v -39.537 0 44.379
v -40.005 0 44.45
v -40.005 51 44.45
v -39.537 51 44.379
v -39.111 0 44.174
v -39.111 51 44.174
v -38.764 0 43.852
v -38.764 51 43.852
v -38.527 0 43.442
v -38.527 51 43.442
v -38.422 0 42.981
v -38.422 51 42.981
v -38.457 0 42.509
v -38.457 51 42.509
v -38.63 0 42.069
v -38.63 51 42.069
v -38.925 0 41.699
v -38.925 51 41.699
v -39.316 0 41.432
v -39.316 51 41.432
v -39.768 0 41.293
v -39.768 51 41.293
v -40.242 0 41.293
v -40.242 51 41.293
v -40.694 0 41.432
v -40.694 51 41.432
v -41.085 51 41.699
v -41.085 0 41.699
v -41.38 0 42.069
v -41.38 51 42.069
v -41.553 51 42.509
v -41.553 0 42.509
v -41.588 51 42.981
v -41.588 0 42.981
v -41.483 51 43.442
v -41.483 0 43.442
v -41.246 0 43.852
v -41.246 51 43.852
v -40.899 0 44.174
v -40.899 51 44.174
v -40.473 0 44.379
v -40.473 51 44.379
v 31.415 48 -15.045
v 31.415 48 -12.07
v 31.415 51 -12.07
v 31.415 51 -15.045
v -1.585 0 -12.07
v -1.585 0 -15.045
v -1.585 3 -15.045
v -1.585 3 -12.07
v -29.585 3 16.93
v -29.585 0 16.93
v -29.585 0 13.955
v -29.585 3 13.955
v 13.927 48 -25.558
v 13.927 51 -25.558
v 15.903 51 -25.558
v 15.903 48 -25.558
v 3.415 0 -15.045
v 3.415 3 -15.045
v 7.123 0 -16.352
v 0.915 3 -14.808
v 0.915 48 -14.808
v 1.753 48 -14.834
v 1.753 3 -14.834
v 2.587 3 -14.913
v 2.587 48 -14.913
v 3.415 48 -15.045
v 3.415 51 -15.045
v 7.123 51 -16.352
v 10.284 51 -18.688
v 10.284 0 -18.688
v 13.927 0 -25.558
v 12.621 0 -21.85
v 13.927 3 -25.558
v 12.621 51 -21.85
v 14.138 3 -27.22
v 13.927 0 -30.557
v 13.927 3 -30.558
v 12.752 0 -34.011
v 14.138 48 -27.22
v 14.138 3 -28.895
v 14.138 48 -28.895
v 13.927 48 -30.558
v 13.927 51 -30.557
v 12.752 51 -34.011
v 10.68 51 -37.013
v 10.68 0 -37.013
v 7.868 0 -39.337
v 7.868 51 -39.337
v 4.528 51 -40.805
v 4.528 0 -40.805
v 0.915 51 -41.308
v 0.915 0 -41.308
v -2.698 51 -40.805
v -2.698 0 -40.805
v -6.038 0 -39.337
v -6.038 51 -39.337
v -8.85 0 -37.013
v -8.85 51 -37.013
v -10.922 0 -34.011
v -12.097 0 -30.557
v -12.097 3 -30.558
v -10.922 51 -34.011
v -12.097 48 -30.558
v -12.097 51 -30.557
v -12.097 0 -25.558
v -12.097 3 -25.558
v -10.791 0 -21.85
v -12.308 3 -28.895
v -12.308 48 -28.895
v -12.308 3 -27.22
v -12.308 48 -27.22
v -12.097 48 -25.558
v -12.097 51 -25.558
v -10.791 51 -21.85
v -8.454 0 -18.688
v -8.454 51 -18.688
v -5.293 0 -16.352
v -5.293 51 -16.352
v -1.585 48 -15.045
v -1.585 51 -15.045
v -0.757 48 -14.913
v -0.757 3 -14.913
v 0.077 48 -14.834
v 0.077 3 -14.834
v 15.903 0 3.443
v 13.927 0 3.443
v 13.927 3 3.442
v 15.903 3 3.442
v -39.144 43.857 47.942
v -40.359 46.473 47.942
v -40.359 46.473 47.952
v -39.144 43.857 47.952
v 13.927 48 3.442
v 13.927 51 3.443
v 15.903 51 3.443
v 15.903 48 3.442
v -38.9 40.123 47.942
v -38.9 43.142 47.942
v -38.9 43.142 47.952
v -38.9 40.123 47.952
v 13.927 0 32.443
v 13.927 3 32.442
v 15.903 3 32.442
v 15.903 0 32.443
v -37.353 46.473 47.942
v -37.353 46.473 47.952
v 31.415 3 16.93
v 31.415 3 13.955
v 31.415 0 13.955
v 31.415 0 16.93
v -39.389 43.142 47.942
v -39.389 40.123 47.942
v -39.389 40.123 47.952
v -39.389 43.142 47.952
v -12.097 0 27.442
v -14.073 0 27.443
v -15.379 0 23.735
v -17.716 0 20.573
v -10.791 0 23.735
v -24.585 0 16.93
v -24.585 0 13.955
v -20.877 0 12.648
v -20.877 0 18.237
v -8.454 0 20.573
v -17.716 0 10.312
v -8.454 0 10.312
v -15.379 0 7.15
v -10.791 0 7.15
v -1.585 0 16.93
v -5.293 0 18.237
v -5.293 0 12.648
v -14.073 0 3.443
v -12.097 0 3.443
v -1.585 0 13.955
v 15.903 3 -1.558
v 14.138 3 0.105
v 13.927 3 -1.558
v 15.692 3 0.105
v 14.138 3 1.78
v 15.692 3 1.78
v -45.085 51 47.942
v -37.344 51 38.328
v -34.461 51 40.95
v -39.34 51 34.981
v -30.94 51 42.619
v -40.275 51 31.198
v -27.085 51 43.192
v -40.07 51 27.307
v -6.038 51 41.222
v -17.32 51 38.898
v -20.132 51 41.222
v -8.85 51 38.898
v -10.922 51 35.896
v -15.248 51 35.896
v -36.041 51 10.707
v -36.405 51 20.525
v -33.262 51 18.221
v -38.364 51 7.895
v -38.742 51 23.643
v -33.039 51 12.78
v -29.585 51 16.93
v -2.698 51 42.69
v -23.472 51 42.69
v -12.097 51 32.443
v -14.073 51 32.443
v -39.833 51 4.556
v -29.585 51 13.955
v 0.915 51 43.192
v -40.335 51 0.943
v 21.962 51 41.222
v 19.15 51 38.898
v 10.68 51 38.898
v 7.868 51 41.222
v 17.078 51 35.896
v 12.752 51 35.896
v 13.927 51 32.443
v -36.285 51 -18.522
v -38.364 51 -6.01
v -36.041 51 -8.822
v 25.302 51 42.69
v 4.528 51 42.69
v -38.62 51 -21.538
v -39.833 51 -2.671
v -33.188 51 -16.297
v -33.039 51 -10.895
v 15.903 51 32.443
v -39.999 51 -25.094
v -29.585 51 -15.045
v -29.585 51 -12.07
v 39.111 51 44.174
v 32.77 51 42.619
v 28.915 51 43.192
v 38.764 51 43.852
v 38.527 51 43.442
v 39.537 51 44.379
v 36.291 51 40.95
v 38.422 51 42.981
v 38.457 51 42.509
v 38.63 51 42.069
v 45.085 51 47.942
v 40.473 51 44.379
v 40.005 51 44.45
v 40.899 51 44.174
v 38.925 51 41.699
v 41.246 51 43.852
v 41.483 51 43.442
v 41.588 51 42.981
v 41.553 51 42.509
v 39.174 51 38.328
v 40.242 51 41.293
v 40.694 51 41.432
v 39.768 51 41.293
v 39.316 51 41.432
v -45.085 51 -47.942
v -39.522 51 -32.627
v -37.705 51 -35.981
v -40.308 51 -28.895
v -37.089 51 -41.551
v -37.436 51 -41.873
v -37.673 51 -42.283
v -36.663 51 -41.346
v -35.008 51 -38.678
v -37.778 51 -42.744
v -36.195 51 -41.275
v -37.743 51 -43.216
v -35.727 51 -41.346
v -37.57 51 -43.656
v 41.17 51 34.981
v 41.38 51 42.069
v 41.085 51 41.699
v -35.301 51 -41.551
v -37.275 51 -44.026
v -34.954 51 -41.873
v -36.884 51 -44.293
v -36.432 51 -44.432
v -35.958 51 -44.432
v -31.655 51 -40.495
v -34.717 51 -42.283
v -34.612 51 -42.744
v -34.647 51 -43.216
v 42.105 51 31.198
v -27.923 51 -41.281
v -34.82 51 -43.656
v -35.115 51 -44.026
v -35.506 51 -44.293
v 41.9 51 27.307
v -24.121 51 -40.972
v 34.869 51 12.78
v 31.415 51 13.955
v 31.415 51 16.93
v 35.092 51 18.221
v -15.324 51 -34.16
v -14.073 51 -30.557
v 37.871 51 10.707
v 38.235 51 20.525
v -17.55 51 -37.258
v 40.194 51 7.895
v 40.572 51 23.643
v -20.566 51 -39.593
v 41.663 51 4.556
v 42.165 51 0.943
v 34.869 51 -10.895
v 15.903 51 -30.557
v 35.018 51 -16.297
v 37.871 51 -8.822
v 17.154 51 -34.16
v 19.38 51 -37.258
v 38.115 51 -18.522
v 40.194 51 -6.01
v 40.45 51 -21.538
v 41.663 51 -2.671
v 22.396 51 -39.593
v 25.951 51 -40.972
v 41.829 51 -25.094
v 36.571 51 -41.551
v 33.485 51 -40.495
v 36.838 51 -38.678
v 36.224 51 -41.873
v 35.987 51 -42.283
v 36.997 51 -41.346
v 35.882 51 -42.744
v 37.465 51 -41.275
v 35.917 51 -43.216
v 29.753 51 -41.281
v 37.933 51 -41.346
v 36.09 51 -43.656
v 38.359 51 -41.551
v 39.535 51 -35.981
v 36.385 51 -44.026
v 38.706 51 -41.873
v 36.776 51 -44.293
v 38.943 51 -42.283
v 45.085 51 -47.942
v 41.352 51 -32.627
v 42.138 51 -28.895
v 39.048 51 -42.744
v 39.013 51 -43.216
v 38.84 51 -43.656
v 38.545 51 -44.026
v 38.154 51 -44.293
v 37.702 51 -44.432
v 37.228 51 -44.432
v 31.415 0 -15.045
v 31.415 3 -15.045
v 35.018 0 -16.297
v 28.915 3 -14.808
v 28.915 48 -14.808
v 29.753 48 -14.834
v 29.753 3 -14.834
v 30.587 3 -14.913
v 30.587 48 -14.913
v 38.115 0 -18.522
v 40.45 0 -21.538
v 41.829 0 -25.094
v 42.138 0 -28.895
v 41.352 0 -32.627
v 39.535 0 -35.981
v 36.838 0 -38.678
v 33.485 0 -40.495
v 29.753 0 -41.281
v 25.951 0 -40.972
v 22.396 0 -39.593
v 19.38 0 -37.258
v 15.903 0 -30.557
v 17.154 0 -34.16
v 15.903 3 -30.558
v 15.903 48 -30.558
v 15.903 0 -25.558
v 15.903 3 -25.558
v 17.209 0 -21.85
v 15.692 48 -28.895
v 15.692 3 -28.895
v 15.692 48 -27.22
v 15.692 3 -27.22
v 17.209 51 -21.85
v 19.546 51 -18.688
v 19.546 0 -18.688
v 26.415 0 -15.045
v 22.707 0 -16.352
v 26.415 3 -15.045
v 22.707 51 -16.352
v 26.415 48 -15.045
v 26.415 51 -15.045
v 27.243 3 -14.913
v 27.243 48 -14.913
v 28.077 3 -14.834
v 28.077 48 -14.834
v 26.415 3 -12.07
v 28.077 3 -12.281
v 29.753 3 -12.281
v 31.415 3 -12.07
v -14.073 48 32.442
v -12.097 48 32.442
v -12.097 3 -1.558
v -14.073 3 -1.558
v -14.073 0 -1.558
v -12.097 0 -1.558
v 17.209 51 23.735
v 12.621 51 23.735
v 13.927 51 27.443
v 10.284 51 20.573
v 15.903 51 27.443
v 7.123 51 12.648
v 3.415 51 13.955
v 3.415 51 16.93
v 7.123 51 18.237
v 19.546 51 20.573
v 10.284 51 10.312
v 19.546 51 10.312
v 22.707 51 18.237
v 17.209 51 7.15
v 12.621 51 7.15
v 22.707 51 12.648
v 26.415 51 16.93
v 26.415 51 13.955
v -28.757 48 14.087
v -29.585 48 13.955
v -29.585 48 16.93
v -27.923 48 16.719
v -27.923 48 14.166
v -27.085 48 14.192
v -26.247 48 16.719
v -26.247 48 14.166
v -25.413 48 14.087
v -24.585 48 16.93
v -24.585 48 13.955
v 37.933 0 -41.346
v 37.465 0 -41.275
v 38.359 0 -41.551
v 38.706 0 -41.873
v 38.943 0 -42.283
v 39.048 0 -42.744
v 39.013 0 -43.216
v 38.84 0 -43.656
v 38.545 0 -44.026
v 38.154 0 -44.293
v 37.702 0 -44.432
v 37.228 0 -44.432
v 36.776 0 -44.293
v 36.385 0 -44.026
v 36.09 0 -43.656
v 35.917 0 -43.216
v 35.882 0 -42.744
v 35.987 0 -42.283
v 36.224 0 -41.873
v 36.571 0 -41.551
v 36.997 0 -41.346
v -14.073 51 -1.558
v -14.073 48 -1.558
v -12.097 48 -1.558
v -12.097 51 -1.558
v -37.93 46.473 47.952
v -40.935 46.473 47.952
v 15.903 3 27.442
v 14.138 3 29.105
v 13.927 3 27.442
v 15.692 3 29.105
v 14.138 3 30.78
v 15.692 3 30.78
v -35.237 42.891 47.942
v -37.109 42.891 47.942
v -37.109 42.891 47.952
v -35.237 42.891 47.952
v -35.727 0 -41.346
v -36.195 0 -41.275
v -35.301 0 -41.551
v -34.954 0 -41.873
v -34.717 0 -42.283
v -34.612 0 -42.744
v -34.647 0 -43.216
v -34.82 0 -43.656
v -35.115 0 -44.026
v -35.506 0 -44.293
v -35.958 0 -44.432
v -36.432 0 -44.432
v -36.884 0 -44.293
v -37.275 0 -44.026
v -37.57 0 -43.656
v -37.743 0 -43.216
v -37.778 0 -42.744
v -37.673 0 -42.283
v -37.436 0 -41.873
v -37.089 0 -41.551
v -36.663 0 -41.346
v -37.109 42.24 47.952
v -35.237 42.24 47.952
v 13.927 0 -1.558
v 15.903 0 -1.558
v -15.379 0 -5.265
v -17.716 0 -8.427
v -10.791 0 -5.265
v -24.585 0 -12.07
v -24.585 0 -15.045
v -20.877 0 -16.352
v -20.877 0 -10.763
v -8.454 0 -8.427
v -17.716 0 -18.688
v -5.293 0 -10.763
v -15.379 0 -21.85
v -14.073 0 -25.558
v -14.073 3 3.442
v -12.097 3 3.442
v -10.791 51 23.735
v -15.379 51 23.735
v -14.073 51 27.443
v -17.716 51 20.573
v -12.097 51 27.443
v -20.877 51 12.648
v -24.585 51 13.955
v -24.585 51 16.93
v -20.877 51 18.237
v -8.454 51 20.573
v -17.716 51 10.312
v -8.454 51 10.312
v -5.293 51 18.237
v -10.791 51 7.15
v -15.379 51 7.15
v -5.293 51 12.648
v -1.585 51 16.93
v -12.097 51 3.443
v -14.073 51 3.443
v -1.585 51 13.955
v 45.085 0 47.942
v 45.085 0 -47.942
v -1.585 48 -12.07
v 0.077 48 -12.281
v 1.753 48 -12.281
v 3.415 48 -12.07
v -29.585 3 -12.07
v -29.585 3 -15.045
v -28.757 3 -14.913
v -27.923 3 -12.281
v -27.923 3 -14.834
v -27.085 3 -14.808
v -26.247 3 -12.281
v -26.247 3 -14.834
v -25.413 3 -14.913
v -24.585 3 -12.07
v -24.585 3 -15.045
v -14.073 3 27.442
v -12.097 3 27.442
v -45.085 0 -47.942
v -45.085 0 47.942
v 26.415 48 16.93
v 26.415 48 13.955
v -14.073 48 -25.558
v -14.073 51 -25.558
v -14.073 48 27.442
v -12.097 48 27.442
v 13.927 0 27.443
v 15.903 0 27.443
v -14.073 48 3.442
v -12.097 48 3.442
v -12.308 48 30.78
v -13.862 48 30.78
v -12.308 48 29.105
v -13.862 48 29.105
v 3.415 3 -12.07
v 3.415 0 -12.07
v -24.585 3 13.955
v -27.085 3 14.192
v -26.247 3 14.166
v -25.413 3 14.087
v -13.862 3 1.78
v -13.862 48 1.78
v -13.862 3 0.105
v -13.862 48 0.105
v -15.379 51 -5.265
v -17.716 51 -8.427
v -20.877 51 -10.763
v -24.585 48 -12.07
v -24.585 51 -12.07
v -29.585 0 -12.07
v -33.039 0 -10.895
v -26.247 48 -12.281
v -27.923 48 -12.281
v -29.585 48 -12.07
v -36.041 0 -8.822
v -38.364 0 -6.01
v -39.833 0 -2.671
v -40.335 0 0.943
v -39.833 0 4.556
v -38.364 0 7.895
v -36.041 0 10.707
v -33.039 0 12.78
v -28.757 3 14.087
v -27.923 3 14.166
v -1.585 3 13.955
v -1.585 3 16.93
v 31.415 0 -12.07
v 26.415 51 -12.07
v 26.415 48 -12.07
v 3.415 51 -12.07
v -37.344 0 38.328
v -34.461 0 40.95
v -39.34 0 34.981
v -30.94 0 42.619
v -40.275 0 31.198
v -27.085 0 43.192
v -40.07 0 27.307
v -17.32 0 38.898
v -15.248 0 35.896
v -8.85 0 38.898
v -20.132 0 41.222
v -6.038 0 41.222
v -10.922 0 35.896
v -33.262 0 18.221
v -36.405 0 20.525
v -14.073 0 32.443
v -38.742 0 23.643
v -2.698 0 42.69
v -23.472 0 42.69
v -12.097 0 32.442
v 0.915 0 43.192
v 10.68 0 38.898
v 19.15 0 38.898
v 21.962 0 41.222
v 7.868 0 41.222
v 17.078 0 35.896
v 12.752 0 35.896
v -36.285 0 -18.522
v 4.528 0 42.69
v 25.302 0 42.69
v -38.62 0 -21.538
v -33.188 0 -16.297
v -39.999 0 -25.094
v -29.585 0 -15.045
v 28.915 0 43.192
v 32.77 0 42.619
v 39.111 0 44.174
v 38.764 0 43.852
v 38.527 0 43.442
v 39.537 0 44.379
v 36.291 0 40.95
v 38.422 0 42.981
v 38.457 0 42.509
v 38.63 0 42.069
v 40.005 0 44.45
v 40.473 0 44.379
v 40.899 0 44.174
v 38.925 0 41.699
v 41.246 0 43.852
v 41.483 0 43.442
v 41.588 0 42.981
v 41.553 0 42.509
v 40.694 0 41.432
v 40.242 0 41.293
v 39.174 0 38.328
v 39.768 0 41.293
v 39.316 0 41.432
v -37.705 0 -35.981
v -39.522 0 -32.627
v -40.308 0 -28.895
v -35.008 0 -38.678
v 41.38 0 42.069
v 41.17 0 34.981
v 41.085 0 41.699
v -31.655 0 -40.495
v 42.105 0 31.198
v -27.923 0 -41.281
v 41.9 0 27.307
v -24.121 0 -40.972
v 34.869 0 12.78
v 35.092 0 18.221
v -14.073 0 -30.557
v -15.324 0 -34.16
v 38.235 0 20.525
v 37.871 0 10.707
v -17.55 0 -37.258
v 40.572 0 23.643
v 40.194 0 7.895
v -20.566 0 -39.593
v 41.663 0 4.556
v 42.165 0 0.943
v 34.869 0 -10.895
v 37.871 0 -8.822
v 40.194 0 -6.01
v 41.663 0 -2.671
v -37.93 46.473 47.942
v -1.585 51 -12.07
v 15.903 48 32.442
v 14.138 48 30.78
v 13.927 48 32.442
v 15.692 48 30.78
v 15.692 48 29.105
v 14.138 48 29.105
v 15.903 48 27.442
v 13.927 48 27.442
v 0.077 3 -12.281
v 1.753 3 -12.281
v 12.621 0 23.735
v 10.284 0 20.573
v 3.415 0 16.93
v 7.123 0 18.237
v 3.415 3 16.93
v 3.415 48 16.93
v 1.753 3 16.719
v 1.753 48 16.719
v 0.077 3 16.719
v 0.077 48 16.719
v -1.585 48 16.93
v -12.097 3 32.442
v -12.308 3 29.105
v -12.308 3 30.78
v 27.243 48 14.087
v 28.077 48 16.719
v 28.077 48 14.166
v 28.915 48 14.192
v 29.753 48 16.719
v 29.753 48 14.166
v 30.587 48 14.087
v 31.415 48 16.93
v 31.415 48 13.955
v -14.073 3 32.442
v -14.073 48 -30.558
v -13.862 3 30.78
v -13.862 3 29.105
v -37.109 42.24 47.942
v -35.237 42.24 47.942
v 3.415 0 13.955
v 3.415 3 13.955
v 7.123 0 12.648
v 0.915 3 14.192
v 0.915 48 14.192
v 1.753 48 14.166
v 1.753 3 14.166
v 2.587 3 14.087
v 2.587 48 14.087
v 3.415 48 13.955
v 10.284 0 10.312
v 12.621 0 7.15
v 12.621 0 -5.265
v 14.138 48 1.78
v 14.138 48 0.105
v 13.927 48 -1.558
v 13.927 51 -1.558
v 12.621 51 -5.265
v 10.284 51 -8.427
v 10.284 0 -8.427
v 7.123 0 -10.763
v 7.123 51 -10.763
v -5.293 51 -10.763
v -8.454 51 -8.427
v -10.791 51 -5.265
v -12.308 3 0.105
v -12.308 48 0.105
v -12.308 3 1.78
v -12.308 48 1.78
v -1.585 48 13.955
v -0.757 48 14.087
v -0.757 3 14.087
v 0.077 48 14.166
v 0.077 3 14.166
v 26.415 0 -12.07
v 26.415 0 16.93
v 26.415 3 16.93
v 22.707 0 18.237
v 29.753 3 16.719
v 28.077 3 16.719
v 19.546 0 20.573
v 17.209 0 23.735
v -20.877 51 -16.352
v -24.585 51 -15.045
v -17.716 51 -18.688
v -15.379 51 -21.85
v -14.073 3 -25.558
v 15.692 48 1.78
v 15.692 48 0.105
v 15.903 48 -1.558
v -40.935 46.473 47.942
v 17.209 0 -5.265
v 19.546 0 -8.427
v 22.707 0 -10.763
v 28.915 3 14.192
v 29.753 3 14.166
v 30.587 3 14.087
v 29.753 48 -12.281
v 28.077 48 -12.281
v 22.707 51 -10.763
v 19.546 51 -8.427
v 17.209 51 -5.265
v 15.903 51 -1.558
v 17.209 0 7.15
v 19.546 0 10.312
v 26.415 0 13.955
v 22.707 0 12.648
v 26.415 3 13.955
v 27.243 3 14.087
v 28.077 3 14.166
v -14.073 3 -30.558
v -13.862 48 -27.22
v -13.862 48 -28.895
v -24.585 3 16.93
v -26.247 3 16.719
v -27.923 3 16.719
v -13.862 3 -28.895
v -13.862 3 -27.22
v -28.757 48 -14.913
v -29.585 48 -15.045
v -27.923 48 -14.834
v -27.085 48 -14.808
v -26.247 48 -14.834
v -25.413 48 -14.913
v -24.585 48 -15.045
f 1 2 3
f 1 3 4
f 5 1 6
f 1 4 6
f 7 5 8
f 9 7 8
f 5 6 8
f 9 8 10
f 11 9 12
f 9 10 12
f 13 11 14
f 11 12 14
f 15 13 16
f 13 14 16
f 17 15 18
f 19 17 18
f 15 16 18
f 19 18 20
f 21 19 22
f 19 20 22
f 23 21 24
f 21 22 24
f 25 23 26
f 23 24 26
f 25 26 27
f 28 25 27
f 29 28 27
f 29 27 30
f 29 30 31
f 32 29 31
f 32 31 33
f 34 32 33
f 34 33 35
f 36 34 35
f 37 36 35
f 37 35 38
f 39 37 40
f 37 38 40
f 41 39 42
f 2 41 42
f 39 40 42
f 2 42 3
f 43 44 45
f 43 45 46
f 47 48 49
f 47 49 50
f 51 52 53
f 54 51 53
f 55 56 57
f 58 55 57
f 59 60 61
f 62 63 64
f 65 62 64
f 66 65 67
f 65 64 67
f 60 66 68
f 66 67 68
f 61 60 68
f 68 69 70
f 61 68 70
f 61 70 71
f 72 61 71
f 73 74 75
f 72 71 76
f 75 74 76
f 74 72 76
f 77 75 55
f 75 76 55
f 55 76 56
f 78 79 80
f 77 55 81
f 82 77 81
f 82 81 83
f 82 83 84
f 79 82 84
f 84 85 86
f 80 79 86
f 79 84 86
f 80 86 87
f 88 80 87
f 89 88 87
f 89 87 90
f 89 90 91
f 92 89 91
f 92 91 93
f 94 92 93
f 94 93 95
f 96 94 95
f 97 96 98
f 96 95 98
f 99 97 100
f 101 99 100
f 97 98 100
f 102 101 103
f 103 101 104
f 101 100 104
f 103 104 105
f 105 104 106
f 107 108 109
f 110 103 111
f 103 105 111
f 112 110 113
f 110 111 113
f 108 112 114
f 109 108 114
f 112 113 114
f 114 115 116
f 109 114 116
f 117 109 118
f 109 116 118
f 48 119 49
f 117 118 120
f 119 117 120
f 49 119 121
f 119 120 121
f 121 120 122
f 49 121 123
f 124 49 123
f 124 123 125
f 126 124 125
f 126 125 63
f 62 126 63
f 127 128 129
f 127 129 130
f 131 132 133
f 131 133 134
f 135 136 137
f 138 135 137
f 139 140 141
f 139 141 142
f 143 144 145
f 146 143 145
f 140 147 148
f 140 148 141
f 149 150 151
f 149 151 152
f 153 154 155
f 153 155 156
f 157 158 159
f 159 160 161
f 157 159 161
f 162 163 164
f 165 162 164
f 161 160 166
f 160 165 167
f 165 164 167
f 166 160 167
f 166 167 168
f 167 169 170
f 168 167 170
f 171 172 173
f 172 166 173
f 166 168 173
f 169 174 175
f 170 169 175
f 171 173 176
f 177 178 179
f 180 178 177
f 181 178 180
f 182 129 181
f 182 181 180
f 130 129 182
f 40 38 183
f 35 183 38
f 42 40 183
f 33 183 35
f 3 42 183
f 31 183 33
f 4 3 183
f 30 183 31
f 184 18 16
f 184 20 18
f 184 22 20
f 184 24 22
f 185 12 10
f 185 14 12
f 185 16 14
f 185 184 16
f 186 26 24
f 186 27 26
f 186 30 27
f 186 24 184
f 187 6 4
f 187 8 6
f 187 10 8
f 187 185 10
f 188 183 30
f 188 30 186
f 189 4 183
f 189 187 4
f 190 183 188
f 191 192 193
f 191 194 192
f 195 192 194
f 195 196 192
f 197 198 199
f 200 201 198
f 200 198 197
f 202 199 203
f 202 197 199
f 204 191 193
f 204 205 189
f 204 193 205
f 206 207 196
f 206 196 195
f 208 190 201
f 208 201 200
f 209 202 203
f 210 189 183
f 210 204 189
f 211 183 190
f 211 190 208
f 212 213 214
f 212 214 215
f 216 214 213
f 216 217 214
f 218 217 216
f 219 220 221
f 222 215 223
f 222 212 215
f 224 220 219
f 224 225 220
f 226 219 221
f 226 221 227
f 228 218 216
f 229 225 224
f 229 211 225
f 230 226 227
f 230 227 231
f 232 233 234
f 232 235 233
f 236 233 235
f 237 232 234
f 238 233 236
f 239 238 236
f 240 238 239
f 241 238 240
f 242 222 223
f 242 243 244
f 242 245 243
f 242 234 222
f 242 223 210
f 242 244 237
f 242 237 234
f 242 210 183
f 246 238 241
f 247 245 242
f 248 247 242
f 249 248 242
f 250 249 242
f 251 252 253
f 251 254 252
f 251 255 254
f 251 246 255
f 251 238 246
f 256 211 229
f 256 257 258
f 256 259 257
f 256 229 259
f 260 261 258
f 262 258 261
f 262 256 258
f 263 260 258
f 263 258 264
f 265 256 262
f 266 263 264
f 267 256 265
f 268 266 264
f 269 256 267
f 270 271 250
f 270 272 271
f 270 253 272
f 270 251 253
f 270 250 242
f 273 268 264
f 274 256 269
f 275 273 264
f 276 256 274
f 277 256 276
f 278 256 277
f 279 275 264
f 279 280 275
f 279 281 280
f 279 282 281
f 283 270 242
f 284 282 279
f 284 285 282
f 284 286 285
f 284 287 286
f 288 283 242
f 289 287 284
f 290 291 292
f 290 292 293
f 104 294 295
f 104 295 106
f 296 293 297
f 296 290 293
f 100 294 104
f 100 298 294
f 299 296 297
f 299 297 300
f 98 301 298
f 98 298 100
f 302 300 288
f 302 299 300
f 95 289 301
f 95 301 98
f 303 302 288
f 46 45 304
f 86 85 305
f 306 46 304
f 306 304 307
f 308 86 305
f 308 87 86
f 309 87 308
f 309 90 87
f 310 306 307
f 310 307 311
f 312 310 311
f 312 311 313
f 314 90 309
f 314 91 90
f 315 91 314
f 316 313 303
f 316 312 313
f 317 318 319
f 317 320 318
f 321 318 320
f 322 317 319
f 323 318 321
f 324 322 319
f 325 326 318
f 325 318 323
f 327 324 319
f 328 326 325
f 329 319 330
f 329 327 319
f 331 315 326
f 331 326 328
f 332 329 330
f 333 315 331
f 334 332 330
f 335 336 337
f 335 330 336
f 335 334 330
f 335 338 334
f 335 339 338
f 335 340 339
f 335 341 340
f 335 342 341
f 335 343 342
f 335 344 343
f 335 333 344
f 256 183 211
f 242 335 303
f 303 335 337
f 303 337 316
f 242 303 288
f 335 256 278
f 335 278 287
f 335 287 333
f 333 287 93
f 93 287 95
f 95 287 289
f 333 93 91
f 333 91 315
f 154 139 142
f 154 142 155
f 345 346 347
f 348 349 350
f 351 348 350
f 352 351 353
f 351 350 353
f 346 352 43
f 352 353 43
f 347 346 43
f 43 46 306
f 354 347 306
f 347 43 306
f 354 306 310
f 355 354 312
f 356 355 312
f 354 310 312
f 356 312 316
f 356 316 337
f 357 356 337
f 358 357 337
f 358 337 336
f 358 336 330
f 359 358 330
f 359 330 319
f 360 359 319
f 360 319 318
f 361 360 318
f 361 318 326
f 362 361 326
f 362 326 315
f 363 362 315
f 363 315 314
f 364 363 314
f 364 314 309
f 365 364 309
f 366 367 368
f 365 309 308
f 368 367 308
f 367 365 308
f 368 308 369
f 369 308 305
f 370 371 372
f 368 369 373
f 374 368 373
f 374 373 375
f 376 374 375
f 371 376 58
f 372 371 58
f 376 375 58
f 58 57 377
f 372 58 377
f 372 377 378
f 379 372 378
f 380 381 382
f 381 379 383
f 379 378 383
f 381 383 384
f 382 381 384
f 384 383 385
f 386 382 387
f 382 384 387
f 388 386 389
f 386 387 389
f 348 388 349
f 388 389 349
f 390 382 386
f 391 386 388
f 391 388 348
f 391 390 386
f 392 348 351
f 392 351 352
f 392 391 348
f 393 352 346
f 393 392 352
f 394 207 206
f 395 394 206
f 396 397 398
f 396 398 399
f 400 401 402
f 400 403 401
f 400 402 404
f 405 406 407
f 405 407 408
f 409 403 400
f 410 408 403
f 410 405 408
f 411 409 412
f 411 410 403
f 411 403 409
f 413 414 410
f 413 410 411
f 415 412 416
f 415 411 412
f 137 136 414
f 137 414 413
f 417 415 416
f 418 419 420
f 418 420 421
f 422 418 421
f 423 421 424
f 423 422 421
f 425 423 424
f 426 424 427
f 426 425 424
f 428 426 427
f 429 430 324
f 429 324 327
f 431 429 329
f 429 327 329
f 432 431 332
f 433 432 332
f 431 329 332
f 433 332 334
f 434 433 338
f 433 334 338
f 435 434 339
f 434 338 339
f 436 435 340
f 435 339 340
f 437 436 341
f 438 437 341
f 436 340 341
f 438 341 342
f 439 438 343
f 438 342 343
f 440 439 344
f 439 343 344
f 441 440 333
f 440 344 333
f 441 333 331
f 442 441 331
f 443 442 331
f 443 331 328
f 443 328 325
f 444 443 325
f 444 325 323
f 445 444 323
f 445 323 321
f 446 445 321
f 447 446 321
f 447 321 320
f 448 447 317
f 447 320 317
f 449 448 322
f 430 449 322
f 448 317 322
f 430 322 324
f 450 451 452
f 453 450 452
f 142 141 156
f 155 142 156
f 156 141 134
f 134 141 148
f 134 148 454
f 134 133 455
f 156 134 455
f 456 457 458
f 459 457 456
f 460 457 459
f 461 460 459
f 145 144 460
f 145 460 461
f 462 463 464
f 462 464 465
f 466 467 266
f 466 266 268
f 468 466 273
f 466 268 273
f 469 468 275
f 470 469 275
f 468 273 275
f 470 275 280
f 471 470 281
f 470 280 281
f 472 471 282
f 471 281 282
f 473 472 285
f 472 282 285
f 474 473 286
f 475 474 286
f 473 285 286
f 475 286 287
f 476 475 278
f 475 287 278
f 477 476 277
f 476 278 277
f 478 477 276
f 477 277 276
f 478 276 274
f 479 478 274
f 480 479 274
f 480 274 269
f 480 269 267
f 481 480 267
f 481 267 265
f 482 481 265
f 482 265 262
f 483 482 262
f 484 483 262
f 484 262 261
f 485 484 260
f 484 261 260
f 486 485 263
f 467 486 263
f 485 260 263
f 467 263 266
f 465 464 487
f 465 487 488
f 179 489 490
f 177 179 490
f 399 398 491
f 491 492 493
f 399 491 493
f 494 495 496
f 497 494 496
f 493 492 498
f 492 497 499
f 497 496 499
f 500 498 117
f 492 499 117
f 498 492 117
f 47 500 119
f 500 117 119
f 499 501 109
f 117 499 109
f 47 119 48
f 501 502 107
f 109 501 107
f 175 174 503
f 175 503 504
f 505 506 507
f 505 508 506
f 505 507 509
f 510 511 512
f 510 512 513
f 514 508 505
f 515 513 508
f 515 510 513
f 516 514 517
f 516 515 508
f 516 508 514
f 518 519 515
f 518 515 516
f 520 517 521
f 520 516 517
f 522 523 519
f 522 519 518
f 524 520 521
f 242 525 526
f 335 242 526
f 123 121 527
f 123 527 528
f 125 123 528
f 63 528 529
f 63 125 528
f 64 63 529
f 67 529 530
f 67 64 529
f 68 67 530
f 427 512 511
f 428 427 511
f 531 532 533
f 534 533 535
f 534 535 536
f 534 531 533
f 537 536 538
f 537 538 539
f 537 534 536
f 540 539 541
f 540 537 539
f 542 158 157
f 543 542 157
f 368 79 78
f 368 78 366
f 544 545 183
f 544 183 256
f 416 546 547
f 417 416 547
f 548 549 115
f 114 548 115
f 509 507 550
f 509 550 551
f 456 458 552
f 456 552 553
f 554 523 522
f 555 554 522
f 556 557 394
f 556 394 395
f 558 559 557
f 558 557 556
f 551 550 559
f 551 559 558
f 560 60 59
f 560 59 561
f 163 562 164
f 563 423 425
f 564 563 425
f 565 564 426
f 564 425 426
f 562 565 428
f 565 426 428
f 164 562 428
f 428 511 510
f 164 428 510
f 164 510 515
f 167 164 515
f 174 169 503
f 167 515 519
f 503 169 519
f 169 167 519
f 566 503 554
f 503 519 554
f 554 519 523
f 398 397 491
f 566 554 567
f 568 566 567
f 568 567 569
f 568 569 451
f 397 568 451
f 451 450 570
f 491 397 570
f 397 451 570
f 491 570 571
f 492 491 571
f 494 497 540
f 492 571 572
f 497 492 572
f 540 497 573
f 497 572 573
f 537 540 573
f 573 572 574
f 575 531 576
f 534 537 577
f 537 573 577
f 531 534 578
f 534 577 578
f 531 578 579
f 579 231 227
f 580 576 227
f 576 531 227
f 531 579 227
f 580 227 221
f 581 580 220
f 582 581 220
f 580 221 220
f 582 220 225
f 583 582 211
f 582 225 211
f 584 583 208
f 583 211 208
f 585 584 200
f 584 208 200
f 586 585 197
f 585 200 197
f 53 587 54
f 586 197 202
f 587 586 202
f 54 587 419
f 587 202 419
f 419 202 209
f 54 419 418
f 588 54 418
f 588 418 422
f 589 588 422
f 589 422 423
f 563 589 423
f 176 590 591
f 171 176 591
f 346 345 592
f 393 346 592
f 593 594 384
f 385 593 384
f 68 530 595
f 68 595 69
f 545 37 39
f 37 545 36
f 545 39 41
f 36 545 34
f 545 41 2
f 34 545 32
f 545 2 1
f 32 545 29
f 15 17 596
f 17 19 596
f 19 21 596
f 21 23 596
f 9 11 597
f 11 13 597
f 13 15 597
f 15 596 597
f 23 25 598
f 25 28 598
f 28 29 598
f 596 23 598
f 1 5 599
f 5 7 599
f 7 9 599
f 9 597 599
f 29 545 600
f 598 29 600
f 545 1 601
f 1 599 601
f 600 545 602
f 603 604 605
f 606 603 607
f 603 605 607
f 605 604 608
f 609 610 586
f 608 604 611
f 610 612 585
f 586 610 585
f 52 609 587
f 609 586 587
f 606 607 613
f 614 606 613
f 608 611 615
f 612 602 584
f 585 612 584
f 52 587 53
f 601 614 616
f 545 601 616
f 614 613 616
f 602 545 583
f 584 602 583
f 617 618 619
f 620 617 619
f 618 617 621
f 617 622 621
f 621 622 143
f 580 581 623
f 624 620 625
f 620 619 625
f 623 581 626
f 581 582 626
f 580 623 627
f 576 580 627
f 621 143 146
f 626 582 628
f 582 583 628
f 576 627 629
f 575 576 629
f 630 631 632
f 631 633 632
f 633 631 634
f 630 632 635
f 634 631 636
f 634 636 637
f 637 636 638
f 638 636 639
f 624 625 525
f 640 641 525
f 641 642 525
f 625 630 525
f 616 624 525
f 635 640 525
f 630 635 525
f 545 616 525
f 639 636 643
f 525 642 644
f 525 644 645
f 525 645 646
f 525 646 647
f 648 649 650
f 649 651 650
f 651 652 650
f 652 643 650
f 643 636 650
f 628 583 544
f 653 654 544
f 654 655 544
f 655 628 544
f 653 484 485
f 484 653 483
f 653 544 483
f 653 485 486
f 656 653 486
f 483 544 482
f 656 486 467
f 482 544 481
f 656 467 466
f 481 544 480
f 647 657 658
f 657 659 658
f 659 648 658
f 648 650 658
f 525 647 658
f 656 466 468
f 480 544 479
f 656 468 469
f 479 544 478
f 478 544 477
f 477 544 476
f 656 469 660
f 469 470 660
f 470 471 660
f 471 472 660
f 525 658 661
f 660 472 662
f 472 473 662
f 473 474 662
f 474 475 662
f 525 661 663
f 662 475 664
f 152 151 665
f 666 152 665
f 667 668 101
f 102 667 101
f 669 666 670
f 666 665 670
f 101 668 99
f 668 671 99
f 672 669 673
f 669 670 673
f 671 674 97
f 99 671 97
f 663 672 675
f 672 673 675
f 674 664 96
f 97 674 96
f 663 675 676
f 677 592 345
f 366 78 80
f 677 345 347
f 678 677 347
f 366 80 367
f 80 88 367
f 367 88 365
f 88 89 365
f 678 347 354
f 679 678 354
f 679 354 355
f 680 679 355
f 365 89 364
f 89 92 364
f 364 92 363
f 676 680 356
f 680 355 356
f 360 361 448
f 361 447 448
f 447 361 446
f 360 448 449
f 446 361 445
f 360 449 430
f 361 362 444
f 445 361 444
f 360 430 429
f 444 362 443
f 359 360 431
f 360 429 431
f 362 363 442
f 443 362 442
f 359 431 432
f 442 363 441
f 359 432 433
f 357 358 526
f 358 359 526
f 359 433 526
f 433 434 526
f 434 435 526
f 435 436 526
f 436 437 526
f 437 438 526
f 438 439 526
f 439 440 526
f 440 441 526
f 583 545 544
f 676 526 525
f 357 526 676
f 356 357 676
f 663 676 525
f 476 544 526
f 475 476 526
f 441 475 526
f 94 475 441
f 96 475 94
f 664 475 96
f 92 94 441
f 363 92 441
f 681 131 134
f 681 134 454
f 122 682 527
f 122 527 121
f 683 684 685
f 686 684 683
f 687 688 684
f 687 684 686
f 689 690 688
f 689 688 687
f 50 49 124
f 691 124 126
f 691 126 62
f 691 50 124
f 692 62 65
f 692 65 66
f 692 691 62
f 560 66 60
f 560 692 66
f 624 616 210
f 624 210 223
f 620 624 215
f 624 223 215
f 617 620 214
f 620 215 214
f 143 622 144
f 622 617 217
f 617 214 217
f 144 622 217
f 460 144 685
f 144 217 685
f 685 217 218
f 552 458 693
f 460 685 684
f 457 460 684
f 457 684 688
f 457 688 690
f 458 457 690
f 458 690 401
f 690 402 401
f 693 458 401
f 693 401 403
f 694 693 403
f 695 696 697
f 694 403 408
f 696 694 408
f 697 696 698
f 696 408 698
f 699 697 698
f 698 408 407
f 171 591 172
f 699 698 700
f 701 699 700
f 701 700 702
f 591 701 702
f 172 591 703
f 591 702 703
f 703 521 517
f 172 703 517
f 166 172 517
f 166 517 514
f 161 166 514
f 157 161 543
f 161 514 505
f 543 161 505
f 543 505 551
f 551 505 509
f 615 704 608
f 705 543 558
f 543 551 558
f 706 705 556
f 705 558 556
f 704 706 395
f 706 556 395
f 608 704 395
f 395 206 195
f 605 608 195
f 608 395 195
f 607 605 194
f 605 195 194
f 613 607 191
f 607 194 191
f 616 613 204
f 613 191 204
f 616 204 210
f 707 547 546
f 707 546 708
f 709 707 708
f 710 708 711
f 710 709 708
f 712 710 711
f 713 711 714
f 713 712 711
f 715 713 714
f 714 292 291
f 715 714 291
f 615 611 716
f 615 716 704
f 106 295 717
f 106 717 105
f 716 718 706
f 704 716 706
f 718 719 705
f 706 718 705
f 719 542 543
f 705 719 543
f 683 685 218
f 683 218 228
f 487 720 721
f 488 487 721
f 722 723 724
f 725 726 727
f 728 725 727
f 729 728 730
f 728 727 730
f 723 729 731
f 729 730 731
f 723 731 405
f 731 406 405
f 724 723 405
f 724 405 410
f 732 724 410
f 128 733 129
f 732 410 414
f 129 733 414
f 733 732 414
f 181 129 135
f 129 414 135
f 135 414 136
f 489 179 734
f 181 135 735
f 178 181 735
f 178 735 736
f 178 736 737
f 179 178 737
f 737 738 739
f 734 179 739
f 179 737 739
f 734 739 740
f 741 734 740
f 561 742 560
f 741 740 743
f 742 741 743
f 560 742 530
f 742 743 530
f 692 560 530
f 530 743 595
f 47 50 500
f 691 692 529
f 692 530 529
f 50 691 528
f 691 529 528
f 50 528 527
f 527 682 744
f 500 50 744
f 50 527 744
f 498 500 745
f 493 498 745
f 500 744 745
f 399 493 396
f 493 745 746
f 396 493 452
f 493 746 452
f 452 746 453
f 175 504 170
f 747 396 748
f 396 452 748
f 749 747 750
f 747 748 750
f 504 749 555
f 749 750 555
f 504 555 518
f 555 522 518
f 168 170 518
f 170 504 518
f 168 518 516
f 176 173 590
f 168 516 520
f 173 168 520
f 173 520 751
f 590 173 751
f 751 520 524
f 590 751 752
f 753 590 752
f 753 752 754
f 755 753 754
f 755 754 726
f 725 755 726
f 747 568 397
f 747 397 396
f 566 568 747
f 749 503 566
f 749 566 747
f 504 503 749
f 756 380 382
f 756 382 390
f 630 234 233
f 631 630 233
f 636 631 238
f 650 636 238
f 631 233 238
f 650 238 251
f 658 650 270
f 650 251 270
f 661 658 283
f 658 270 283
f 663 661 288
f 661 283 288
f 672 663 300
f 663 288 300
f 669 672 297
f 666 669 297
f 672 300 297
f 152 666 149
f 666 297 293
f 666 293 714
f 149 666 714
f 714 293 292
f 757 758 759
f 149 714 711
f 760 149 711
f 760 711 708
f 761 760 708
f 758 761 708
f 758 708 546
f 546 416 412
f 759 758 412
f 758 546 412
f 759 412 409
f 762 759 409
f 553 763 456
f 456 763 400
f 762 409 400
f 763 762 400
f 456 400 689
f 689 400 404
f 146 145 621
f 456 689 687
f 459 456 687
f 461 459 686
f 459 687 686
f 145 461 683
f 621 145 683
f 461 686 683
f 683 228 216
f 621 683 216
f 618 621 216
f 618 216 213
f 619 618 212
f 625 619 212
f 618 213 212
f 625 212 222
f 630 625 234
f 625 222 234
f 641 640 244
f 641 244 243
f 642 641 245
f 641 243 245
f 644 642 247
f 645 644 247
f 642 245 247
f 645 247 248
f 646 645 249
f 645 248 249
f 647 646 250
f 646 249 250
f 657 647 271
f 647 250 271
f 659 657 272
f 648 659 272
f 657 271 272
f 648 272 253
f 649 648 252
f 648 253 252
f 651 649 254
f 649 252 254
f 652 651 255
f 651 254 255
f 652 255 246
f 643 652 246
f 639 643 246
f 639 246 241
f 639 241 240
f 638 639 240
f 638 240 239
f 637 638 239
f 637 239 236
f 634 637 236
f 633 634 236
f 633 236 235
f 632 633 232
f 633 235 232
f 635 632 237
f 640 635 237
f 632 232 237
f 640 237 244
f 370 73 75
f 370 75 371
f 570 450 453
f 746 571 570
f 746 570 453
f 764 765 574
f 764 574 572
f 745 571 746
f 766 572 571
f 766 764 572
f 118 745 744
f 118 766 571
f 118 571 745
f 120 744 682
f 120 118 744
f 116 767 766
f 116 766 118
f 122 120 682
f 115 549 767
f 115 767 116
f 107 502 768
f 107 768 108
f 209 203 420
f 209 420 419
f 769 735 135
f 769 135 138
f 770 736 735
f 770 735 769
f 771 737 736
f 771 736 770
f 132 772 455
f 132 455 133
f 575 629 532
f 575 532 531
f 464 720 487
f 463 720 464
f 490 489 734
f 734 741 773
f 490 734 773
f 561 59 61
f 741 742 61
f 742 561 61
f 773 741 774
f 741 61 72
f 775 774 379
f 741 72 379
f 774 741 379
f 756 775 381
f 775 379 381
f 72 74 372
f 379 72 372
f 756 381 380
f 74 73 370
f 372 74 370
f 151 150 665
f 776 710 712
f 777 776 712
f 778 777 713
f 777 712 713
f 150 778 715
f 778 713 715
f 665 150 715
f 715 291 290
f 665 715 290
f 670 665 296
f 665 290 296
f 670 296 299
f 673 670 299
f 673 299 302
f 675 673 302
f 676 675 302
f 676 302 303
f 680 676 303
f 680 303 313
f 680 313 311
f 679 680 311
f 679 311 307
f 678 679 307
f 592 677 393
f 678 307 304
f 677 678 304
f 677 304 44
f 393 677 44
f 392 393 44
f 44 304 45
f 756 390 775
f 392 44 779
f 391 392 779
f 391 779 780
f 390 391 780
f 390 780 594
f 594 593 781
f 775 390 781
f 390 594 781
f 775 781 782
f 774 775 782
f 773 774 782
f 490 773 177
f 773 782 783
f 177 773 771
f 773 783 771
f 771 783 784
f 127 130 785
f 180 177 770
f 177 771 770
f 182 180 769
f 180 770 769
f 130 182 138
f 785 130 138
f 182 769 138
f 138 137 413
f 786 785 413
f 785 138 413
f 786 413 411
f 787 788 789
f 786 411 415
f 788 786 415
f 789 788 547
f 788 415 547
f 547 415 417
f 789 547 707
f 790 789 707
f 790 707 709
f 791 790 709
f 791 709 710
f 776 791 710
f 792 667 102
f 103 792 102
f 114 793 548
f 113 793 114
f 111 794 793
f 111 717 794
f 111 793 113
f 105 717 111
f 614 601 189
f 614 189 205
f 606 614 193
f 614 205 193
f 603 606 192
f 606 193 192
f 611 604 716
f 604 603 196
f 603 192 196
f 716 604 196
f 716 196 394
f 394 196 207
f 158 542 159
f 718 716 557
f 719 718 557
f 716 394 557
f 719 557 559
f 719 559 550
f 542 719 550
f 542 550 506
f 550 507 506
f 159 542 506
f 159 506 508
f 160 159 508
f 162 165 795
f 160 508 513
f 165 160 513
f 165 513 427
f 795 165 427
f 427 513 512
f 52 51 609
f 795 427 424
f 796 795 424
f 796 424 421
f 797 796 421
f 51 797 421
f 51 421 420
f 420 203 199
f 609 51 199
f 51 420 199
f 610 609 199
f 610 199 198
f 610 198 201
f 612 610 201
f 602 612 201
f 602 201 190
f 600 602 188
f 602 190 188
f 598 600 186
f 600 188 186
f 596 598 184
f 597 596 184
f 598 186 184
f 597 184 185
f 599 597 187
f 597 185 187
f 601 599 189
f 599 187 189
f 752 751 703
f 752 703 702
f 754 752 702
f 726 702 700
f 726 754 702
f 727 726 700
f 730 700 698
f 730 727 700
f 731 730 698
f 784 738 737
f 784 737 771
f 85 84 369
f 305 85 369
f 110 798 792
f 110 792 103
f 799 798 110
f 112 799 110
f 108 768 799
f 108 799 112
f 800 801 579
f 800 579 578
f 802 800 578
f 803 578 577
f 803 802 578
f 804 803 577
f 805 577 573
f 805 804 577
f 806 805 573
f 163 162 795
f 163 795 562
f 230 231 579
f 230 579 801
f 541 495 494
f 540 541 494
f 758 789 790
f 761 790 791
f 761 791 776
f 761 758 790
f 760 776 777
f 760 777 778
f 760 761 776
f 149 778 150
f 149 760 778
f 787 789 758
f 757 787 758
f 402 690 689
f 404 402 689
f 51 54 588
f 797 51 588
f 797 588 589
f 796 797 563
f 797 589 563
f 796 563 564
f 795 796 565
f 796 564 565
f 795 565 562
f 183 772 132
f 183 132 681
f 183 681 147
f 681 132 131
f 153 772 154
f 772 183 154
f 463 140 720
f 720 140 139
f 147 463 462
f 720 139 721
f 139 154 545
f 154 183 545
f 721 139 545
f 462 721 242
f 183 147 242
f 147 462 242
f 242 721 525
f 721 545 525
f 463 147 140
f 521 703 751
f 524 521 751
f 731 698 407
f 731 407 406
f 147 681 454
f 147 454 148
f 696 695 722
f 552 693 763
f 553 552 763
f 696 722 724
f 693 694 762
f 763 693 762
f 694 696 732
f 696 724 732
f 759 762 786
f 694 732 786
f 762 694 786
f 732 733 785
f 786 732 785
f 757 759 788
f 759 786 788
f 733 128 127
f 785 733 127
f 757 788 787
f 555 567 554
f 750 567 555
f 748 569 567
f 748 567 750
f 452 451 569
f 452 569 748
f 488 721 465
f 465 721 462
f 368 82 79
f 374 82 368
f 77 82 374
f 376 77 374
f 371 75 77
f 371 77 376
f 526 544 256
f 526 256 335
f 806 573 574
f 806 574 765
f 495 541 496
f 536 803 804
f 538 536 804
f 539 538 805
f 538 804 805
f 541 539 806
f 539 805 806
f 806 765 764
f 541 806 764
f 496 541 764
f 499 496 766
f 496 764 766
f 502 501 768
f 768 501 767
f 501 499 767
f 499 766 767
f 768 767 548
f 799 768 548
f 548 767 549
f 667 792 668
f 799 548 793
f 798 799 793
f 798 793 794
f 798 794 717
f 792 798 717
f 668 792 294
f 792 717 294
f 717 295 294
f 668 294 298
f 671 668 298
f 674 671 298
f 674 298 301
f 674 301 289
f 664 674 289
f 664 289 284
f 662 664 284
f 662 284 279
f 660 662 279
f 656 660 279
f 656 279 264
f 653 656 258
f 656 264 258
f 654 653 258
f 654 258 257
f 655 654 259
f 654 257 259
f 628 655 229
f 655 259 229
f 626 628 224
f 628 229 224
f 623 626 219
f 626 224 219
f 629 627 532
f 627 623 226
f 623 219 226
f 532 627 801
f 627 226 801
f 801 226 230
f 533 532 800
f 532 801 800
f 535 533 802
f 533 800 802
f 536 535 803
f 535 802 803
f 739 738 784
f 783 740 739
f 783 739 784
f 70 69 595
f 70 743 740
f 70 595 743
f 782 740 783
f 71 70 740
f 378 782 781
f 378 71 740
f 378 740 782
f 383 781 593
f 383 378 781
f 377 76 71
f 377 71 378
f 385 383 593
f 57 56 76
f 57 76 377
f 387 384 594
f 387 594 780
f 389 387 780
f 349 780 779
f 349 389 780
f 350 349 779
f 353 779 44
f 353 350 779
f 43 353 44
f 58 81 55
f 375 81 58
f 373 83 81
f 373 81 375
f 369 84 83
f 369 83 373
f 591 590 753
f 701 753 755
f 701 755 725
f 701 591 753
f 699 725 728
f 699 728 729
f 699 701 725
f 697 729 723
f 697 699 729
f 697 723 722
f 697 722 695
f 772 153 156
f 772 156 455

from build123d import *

# Parameters (mm, degrees)
SKETCH1_W                 = 90.17
SKETCH1_H                 = 95.885
BOSS_EXTRUDE1_DEPTH       = 51
SKETCH2_R                 = 1.5875
CUT_EXTRUDE1_DEPTH        = 51
SKETCH3_R                 = 13.25
CUT_EXTRUDE2_DEPTH        = 51
LPATTERN1_COUNT           = 3
LPATTERN1_PITCH           = 29
LPATTERN2_COUNT           = 3
LPATTERN2_PITCH           = 28
LPATTERN2_COPY_1_SKETCH_R = 13.25
LPATTERN2_COPY_1_DEPTH    = 51
LPATTERN2_COPY_2_SKETCH_R = 13.25
LPATTERN2_COPY_2_DEPTH    = 51
LPATTERN2_COPY_3_SKETCH_R = 13.25
LPATTERN2_COPY_3_DEPTH    = 51
LPATTERN2_COPY_4_SKETCH_R = 13.25
LPATTERN2_COPY_4_DEPTH    = 51
SKETCH4_W                 = 1.872435897
SKETCH4_H                 = 0.651282051
BOSS_EXTRUDE2_DEPTH       = 0.01
SKETCH6_W                 = 5
SKETCH6_H                 = 10
CUT_EXTRUDE3_DEPTH        = 3
LPATTERN3_COUNT           = 2
LPATTERN3_PITCH           = 29
LPATTERN4_COUNT           = 3
LPATTERN4_PITCH           = 28
LPATTERN4_COPY_1_SKETCH_W = 5
LPATTERN4_COPY_1_SKETCH_H = 10
LPATTERN4_COPY_1_DEPTH    = 3
LPATTERN4_COPY_2_SKETCH_W = 5
LPATTERN4_COPY_2_SKETCH_H = 10
LPATTERN4_COPY_2_DEPTH    = 3
SKETCH7_W                 = 8.328938764
SKETCH7_H                 = 5
CUT_EXTRUDE4_DEPTH        = 3
LPATTERN5_COUNT           = 2
LPATTERN5_PITCH           = 28
LPATTERN6_COUNT           = 3
LPATTERN6_PITCH           = 29
LPATTERN6_COPY_1_SKETCH_W = 8.328938764
LPATTERN6_COPY_1_SKETCH_H = 5
LPATTERN6_COPY_1_DEPTH    = 3
LPATTERN6_COPY_2_SKETCH_W = 8.328938764
LPATTERN6_COPY_2_SKETCH_H = 5
LPATTERN6_COPY_2_DEPTH    = 3
MIRROR2_COPY_1_SKETCH_W   = 5
MIRROR2_COPY_1_SKETCH_H   = 10
MIRROR2_COPY_1_DEPTH      = 3
MIRROR2_COPY_2_SKETCH_W   = 5
MIRROR2_COPY_2_SKETCH_H   = 10
MIRROR2_COPY_2_DEPTH      = 3
MIRROR2_COPY_3_SKETCH_W   = 5
MIRROR2_COPY_3_SKETCH_H   = 10
MIRROR2_COPY_3_DEPTH      = 3
MIRROR2_COPY_4_SKETCH_W   = 5
MIRROR2_COPY_4_SKETCH_H   = 10
MIRROR2_COPY_4_DEPTH      = 3
MIRROR2_COPY_5_SKETCH_W   = 5
MIRROR2_COPY_5_SKETCH_H   = 10
MIRROR2_COPY_5_DEPTH      = 3
MIRROR2_COPY_6_SKETCH_W   = 8.328938764
MIRROR2_COPY_6_SKETCH_H   = 5
MIRROR2_COPY_6_DEPTH      = 3
MIRROR2_COPY_7_SKETCH_W   = 8.328938764
MIRROR2_COPY_7_SKETCH_H   = 5
MIRROR2_COPY_7_DEPTH      = 3
MIRROR2_COPY_8_SKETCH_W   = 8.328938764
MIRROR2_COPY_8_SKETCH_H   = 5
MIRROR2_COPY_8_DEPTH      = 3
MIRROR2_COPY_9_SKETCH_W   = 8.328938764
MIRROR2_COPY_9_SKETCH_H   = 5
MIRROR2_COPY_9_DEPTH      = 3
MIRROR2_COPY_10_SKETCH_W  = 8.328938764
MIRROR2_COPY_10_SKETCH_H  = 5
MIRROR2_COPY_10_DEPTH     = 3


with BuildPart() as part:
    # Sketch1 → Boss-Extrude1 (new body)
    with BuildSketch(Plane(origin=(0, 0, 0), x_dir=(1, 0, 0), z_dir=(0, 1, 0))):
        Rectangle(SKETCH1_W, SKETCH1_H)
    extrude(amount=BOSS_EXTRUDE1_DEPTH)

    # Sketch2 → Cut-Extrude1 (cut)
    with BuildSketch(Plane(origin=(0, 51, 0), x_dir=(1, 0, 0), z_dir=(0, 1, 0))):
        with Locations(Location((-36.195, 42.8625, 0), (0, 0, 270))):
            Circle(SKETCH2_R)
        with Locations(Location((37.465, 42.8625, 0), (0, 0, 270))):
            Circle(SKETCH2_R)
        with Locations(Location((-40.005, -42.8625, 0), (0, 0, 270))):
            Circle(SKETCH2_R)
        with Locations(Location((40.005, -42.8625, 0), (0, 0, 270))):
            Circle(SKETCH2_R)
    extrude(amount=-CUT_EXTRUDE1_DEPTH, mode=Mode.SUBTRACT)

    # Sketch3 → Cut-Extrude2 (cut)
    with BuildSketch(Plane(origin=(0, 51, 0), x_dir=(1, 0, 0), z_dir=(0, 1, 0))):
        with Locations(Location((-27.085, -29.9425, 0), (0, 0, 270))):
            Circle(SKETCH3_R)
    cut_extrude2 = extrude(amount=-CUT_EXTRUDE2_DEPTH, mode=Mode.SUBTRACT)

    # LPattern1: Cut-Extrude2 ×3
    with Locations(*[(0, 0, -i * LPATTERN1_PITCH) for i in range(1, LPATTERN1_COUNT)]):
        add(cut_extrude2, mode=Mode.SUBTRACT)

    # LPattern2: Cut-Extrude2 ×3
    with Locations(*[(i * LPATTERN2_PITCH, 0, 0) for i in range(1, LPATTERN2_COUNT)]):
        add(cut_extrude2, mode=Mode.SUBTRACT)

    # LPattern2 copy 1 sketch → LPattern2 copy 1 (cut)
    with BuildSketch(Plane(origin=(28, 51, -29), x_dir=(1, 0, 0), z_dir=(0, 1, 0))):
        with Locations(Location((-27.085, -29.9425, 0), (0, 0, 270))):
            Circle(LPATTERN2_COPY_1_SKETCH_R)
    extrude(amount=-LPATTERN2_COPY_1_DEPTH, mode=Mode.SUBTRACT)

    # LPattern2 copy 2 sketch → LPattern2 copy 2 (cut)
    with BuildSketch(Plane(origin=(56, 51, -29), x_dir=(1, 0, 0), z_dir=(0, 1, 0))):
        with Locations(Location((-27.085, -29.9425, 0), (0, 0, 270))):
            Circle(LPATTERN2_COPY_2_SKETCH_R)
    extrude(amount=-LPATTERN2_COPY_2_DEPTH, mode=Mode.SUBTRACT)

    # LPattern2 copy 3 sketch → LPattern2 copy 3 (cut)
    with BuildSketch(Plane(origin=(28, 51, -58), x_dir=(1, 0, 0), z_dir=(0, 1, 0))):
        with Locations(Location((-27.085, -29.9425, 0), (0, 0, 270))):
            Circle(LPATTERN2_COPY_3_SKETCH_R)
    extrude(amount=-LPATTERN2_COPY_3_DEPTH, mode=Mode.SUBTRACT)

    # LPattern2 copy 4 sketch → LPattern2 copy 4 (cut)
    with BuildSketch(Plane(origin=(56, 51, -58), x_dir=(1, 0, 0), z_dir=(0, 1, 0))):
        with Locations(Location((-27.085, -29.9425, 0), (0, 0, 270))):
            Circle(LPATTERN2_COPY_4_SKETCH_R)
    extrude(amount=-LPATTERN2_COPY_4_DEPTH, mode=Mode.SUBTRACT)

    # Sketch4 → Boss-Extrude2 (add)
    with BuildSketch(Plane.XY.offset(47.9425)):
        Polygon((-40.935431089, 46.473214492), (-40.359199118, 46.473214492), (-39.144405448, 43.85663797), (-37.929611778, 46.473214492), (-37.353379807, 46.473214492), (-38.900174678, 43.141754156), (-38.900174678, 40.123214492), (-39.388636217, 40.123214492), (-39.388636217, 43.141754156), align=None)
        with Locations((-36.172931089, 42.565522184)):
            Rectangle(SKETCH4_W, SKETCH4_H)
    extrude(amount=BOSS_EXTRUDE2_DEPTH)

    # Sketch6 → Cut-Extrude3 (cut)
    with BuildSketch(Plane(origin=(0, 51, 0), x_dir=(1, 0, 0), z_dir=(0, 1, 0))):
        with Locations((-27.085, -15.4425)):
            Rectangle(SKETCH6_W, SKETCH6_H)
    cut_extrude3 = extrude(amount=-CUT_EXTRUDE3_DEPTH, mode=Mode.SUBTRACT)

    # LPattern3: Cut-Extrude3 ×2
    with Locations(*[(0, 0, -i * LPATTERN3_PITCH) for i in range(1, LPATTERN3_COUNT)]):
        add(cut_extrude3, mode=Mode.SUBTRACT)

    # LPattern4: Cut-Extrude3 ×3
    with Locations(*[(i * LPATTERN4_PITCH, 0, 0) for i in range(1, LPATTERN4_COUNT)]):
        add(cut_extrude3, mode=Mode.SUBTRACT)

    # LPattern4 copy 1 sketch → LPattern4 copy 1 (cut)
    with BuildSketch(Plane(origin=(28, 51, -29), x_dir=(1, 0, 0), z_dir=(0, 1, 0))):
        with Locations((-27.085, -15.4425)):
            Rectangle(LPATTERN4_COPY_1_SKETCH_W, LPATTERN4_COPY_1_SKETCH_H)
    extrude(amount=-LPATTERN4_COPY_1_DEPTH, mode=Mode.SUBTRACT)

    # LPattern4 copy 2 sketch → LPattern4 copy 2 (cut)
    with BuildSketch(Plane(origin=(56, 51, -29), x_dir=(1, 0, 0), z_dir=(0, 1, 0))):
        with Locations((-27.085, -15.4425)):
            Rectangle(LPATTERN4_COPY_2_SKETCH_W, LPATTERN4_COPY_2_SKETCH_H)
    extrude(amount=-LPATTERN4_COPY_2_DEPTH, mode=Mode.SUBTRACT)

    # Sketch7 → Cut-Extrude4 (cut)
    with BuildSketch(Plane(origin=(0, 51, 0), x_dir=(1, 0, 0), z_dir=(0, 1, 0))):
        with Locations((-13.085, -29.9425)):
            Rectangle(SKETCH7_W, SKETCH7_H)
    cut_extrude4 = extrude(amount=-CUT_EXTRUDE4_DEPTH, mode=Mode.SUBTRACT)

    # LPattern5: Cut-Extrude4 ×2
    with Locations(*[(i * LPATTERN5_PITCH, 0, 0) for i in range(1, LPATTERN5_COUNT)]):
        add(cut_extrude4, mode=Mode.SUBTRACT)

    # LPattern6: Cut-Extrude4 ×3
    with Locations(*[(0, 0, -i * LPATTERN6_PITCH) for i in range(1, LPATTERN6_COUNT)]):
        add(cut_extrude4, mode=Mode.SUBTRACT)

    # LPattern6 copy 1 sketch → LPattern6 copy 1 (cut)
    with BuildSketch(Plane(origin=(28, 51, -29), x_dir=(1, 0, 0), z_dir=(0, 1, 0))):
        with Locations((-13.085, -29.9425)):
            Rectangle(LPATTERN6_COPY_1_SKETCH_W, LPATTERN6_COPY_1_SKETCH_H)
    extrude(amount=-LPATTERN6_COPY_1_DEPTH, mode=Mode.SUBTRACT)

    # LPattern6 copy 2 sketch → LPattern6 copy 2 (cut)
    with BuildSketch(Plane(origin=(28, 51, -58), x_dir=(1, 0, 0), z_dir=(0, 1, 0))):
        with Locations((-13.085, -29.9425)):
            Rectangle(LPATTERN6_COPY_2_SKETCH_W, LPATTERN6_COPY_2_SKETCH_H)
    extrude(amount=-LPATTERN6_COPY_2_DEPTH, mode=Mode.SUBTRACT)

    # Mirror2: Cut-Extrude3, Cut-Extrude4 across plane
    add(cut_extrude3.mirror(Plane.ZX.offset(25.5)), mode=Mode.SUBTRACT)
    add(cut_extrude4.mirror(Plane.ZX.offset(25.5)), mode=Mode.SUBTRACT)

    # Mirror2 copy 1 sketch → Mirror2 copy 1 (cut)
    with BuildSketch(Plane(origin=(0, 0, -29), x_dir=(1, 0, 0), z_dir=(0, -1, 0))):
        with Locations((-27.085, 15.4425)):
            Rectangle(MIRROR2_COPY_1_SKETCH_W, MIRROR2_COPY_1_SKETCH_H)
    extrude(amount=-MIRROR2_COPY_1_DEPTH, mode=Mode.SUBTRACT)

    # Mirror2 copy 2 sketch → Mirror2 copy 2 (cut)
    with BuildSketch(Plane(origin=(28, 0, 0), x_dir=(1, 0, 0), z_dir=(0, -1, 0))):
        with Locations((-27.085, 15.4425)):
            Rectangle(MIRROR2_COPY_2_SKETCH_W, MIRROR2_COPY_2_SKETCH_H)
    extrude(amount=-MIRROR2_COPY_2_DEPTH, mode=Mode.SUBTRACT)

    # Mirror2 copy 3 sketch → Mirror2 copy 3 (cut)
    with BuildSketch(Plane(origin=(56, 0, 0), x_dir=(1, 0, 0), z_dir=(0, -1, 0))):
        with Locations((-27.085, 15.4425)):
            Rectangle(MIRROR2_COPY_3_SKETCH_W, MIRROR2_COPY_3_SKETCH_H)
    extrude(amount=-MIRROR2_COPY_3_DEPTH, mode=Mode.SUBTRACT)

    # Mirror2 copy 4 sketch → Mirror2 copy 4 (cut)
    with BuildSketch(Plane(origin=(28, 0, -29), x_dir=(1, 0, 0), z_dir=(0, -1, 0))):
        with Locations((-27.085, 15.4425)):
            Rectangle(MIRROR2_COPY_4_SKETCH_W, MIRROR2_COPY_4_SKETCH_H)
    extrude(amount=-MIRROR2_COPY_4_DEPTH, mode=Mode.SUBTRACT)

    # Mirror2 copy 5 sketch → Mirror2 copy 5 (cut)
    with BuildSketch(Plane(origin=(56, 0, -29), x_dir=(1, 0, 0), z_dir=(0, -1, 0))):
        with Locations((-27.085, 15.4425)):
            Rectangle(MIRROR2_COPY_5_SKETCH_W, MIRROR2_COPY_5_SKETCH_H)
    extrude(amount=-MIRROR2_COPY_5_DEPTH, mode=Mode.SUBTRACT)

    # Mirror2 copy 6 sketch → Mirror2 copy 6 (cut)
    with BuildSketch(Plane(origin=(28, 0, 0), x_dir=(1, 0, 0), z_dir=(0, -1, 0))):
        with Locations((-13.085, 29.9425)):
            Rectangle(MIRROR2_COPY_6_SKETCH_W, MIRROR2_COPY_6_SKETCH_H)
    extrude(amount=-MIRROR2_COPY_6_DEPTH, mode=Mode.SUBTRACT)

    # Mirror2 copy 7 sketch → Mirror2 copy 7 (cut)
    with BuildSketch(Plane(origin=(0, 0, -29), x_dir=(1, 0, 0), z_dir=(0, -1, 0))):
        with Locations((-13.085, 29.9425)):
            Rectangle(MIRROR2_COPY_7_SKETCH_W, MIRROR2_COPY_7_SKETCH_H)
    extrude(amount=-MIRROR2_COPY_7_DEPTH, mode=Mode.SUBTRACT)

    # Mirror2 copy 8 sketch → Mirror2 copy 8 (cut)
    with BuildSketch(Plane(origin=(0, 0, -58), x_dir=(1, 0, 0), z_dir=(0, -1, 0))):
        with Locations((-13.085, 29.9425)):
            Rectangle(MIRROR2_COPY_8_SKETCH_W, MIRROR2_COPY_8_SKETCH_H)
    extrude(amount=-MIRROR2_COPY_8_DEPTH, mode=Mode.SUBTRACT)

    # Mirror2 copy 9 sketch → Mirror2 copy 9 (cut)
    with BuildSketch(Plane(origin=(28, 0, -29), x_dir=(1, 0, 0), z_dir=(0, -1, 0))):
        with Locations((-13.085, 29.9425)):
            Rectangle(MIRROR2_COPY_9_SKETCH_W, MIRROR2_COPY_9_SKETCH_H)
    extrude(amount=-MIRROR2_COPY_9_DEPTH, mode=Mode.SUBTRACT)

    # Mirror2 copy 10 sketch → Mirror2 copy 10 (cut)
    with BuildSketch(Plane(origin=(28, 0, -58), x_dir=(1, 0, 0), z_dir=(0, -1, 0))):
        with Locations((-13.085, 29.9425)):
            Rectangle(MIRROR2_COPY_10_SKETCH_W, MIRROR2_COPY_10_SKETCH_H)
    extrude(amount=-MIRROR2_COPY_10_DEPTH, mode=Mode.SUBTRACT)


solid = part.part
